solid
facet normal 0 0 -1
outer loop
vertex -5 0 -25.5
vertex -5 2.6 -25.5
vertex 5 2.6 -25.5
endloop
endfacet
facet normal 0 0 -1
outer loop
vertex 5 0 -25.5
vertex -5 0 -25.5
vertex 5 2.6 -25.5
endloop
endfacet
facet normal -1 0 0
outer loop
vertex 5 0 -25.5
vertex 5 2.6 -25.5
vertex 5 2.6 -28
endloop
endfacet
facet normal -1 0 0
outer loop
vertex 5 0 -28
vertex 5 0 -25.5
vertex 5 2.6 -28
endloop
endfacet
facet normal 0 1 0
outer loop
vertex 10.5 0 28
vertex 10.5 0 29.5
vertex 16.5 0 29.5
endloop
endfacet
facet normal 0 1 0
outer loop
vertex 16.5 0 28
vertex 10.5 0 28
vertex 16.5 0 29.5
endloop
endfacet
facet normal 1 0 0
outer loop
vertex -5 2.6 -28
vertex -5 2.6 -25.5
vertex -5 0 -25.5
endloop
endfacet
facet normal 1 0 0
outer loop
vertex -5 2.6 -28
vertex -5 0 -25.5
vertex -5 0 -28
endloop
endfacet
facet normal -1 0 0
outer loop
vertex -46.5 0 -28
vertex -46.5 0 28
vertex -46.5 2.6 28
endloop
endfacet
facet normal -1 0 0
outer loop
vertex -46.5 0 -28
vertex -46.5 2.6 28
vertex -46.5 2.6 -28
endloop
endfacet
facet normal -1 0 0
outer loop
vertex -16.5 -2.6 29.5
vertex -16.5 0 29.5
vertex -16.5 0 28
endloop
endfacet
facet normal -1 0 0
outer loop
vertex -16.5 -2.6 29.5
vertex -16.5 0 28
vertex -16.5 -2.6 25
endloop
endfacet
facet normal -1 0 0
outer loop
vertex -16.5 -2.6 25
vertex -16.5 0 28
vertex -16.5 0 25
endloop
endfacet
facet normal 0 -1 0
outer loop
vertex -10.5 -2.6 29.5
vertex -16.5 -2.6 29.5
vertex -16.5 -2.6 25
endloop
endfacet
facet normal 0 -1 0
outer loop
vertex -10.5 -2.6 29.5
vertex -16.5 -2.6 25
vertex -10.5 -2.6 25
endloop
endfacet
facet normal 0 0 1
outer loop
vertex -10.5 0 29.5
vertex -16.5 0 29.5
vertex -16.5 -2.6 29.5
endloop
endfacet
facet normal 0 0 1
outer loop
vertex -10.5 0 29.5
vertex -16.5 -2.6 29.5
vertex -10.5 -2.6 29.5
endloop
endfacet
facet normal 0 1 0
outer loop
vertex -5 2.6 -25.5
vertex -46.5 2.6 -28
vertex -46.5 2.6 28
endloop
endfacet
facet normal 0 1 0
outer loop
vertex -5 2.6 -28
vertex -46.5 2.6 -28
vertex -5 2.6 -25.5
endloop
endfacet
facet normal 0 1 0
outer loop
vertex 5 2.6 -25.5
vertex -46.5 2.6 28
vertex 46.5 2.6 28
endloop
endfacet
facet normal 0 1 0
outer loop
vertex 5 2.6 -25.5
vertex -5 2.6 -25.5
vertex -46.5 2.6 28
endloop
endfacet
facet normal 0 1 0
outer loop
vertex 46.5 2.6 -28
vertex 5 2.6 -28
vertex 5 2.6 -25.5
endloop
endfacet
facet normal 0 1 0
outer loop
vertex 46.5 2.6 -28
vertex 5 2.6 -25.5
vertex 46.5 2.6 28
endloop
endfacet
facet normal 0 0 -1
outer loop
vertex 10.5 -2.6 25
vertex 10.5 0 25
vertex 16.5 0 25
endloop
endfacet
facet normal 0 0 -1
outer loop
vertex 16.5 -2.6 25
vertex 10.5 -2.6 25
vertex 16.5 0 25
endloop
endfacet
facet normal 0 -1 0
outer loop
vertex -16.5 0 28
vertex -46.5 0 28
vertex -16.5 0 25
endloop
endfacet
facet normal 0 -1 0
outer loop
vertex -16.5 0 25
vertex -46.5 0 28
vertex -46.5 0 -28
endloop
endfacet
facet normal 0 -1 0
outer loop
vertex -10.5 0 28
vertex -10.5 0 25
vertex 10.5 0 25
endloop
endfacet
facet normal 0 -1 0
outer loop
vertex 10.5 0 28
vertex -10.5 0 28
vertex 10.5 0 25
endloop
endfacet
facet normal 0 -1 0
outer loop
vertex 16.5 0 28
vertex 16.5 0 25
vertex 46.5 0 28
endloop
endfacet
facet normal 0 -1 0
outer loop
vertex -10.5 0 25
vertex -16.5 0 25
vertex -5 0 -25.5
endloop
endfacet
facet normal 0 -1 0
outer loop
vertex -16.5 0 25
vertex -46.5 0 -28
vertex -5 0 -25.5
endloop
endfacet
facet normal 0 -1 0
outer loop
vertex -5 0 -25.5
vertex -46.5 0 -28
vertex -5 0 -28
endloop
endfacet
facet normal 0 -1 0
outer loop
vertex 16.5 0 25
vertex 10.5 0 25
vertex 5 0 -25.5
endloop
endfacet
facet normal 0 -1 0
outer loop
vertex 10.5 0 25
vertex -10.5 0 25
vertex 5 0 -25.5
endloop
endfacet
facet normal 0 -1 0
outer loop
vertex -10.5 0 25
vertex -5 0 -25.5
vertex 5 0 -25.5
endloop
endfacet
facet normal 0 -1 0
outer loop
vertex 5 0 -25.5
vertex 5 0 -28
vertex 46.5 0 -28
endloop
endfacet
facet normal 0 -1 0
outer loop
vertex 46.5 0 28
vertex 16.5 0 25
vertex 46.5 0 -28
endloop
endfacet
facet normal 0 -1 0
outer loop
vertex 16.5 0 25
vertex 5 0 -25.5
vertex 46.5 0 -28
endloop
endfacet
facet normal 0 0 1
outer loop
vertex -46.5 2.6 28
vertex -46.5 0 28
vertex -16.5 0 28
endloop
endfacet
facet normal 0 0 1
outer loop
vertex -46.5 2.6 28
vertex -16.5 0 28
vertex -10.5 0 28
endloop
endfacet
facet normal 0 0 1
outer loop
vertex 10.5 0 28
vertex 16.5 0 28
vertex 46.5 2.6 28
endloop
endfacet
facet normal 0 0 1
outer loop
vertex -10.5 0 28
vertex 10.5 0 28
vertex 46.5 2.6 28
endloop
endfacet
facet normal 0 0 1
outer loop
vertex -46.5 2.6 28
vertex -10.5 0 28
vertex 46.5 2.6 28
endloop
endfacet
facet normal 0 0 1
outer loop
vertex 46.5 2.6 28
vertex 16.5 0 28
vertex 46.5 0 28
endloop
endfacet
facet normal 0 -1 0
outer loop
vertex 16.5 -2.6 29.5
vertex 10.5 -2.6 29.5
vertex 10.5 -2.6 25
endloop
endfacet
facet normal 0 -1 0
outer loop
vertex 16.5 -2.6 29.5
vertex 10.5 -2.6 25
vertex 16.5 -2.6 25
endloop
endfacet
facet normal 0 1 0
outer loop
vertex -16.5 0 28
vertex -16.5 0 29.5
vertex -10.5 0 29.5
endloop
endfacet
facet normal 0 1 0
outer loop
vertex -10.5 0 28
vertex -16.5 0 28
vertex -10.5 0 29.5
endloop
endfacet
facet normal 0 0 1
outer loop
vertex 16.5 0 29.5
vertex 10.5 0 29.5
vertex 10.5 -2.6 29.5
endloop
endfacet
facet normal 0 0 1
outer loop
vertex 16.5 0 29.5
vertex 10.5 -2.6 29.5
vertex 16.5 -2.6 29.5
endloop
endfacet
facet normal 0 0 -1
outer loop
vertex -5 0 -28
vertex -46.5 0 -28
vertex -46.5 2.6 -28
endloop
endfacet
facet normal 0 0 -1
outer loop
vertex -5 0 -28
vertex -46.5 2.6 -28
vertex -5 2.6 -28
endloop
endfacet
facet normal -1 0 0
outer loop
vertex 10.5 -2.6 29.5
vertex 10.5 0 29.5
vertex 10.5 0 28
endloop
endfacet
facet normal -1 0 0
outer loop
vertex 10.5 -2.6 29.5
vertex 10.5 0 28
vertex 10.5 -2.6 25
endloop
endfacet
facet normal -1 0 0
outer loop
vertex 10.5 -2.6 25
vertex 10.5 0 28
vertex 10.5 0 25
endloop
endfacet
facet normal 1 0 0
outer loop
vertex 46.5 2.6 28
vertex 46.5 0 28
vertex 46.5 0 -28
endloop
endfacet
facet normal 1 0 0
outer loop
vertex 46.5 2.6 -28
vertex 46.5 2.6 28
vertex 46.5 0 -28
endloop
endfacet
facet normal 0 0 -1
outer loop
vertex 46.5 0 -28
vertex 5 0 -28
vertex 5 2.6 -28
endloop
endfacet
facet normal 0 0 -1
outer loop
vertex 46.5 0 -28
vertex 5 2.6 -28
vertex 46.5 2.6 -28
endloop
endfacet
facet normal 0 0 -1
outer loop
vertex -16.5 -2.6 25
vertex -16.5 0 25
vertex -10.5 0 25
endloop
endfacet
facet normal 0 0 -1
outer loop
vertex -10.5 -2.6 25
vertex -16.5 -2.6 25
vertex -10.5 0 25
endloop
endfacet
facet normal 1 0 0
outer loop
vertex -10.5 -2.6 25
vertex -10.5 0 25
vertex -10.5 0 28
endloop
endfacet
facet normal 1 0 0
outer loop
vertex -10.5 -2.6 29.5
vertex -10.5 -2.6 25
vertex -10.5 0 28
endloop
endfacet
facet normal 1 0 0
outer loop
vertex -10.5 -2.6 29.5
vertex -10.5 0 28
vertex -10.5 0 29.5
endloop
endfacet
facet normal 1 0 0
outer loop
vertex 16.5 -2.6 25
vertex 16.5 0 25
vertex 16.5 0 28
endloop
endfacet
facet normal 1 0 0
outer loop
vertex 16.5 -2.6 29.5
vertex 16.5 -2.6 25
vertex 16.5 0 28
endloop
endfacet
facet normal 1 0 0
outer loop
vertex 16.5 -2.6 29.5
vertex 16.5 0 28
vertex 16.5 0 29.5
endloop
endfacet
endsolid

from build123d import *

# Parameters (mm, degrees)
CROQUIS1_W              = 93
CROQUIS1_H              = 56
SALIENTE_EXTRUIR1_DEPTH = 2.6
CROQUIS2_W              = 10
CROQUIS2_H              = 2.5
CORTAR_EXTRUIR1_DEPTH   = 2.6
CROQUIS3_W              = 6
CROQUIS3_H              = 1.5
CROQUIS3_H_2            = 3
SALIENTE_EXTRUIR2_DEPTH = 2.6


with BuildPart() as part:
    # Croquis1 → Saliente-Extruir1 (new body)
    with BuildSketch(Plane(origin=(0, 0, 0), x_dir=(1, 0, 0), z_dir=(0, 1, 0))):
        Rectangle(CROQUIS1_W, CROQUIS1_H)
    extrude(amount=SALIENTE_EXTRUIR1_DEPTH)

    # Croquis2 → Cortar-Extruir1 (cut)
    with BuildSketch(Plane(origin=(0, 2.6, 0), x_dir=(1, 0, 0), z_dir=(0, 1, 0))):
        with Locations((0, 26.75)):
            Rectangle(CROQUIS2_W, CROQUIS2_H)
    extrude(amount=-CORTAR_EXTRUIR1_DEPTH, mode=Mode.SUBTRACT)

    # Croquis3 → Saliente-Extruir2 (add)
    with BuildSketch(Plane.XZ):
        with Locations((13.5, 28.75)):
            Rectangle(CROQUIS3_W, CROQUIS3_H)
        with Locations((13.5, 26.5)):
            Rectangle(CROQUIS3_W, CROQUIS3_H_2)
        with Locations((-13.5, 28.75)):
            Rectangle(CROQUIS3_W, CROQUIS3_H)
        with Locations((-13.5, 26.5)):
            Rectangle(CROQUIS3_W, CROQUIS3_H_2)
    extrude(amount=SALIENTE_EXTRUIR2_DEPTH)


solid = part.part
